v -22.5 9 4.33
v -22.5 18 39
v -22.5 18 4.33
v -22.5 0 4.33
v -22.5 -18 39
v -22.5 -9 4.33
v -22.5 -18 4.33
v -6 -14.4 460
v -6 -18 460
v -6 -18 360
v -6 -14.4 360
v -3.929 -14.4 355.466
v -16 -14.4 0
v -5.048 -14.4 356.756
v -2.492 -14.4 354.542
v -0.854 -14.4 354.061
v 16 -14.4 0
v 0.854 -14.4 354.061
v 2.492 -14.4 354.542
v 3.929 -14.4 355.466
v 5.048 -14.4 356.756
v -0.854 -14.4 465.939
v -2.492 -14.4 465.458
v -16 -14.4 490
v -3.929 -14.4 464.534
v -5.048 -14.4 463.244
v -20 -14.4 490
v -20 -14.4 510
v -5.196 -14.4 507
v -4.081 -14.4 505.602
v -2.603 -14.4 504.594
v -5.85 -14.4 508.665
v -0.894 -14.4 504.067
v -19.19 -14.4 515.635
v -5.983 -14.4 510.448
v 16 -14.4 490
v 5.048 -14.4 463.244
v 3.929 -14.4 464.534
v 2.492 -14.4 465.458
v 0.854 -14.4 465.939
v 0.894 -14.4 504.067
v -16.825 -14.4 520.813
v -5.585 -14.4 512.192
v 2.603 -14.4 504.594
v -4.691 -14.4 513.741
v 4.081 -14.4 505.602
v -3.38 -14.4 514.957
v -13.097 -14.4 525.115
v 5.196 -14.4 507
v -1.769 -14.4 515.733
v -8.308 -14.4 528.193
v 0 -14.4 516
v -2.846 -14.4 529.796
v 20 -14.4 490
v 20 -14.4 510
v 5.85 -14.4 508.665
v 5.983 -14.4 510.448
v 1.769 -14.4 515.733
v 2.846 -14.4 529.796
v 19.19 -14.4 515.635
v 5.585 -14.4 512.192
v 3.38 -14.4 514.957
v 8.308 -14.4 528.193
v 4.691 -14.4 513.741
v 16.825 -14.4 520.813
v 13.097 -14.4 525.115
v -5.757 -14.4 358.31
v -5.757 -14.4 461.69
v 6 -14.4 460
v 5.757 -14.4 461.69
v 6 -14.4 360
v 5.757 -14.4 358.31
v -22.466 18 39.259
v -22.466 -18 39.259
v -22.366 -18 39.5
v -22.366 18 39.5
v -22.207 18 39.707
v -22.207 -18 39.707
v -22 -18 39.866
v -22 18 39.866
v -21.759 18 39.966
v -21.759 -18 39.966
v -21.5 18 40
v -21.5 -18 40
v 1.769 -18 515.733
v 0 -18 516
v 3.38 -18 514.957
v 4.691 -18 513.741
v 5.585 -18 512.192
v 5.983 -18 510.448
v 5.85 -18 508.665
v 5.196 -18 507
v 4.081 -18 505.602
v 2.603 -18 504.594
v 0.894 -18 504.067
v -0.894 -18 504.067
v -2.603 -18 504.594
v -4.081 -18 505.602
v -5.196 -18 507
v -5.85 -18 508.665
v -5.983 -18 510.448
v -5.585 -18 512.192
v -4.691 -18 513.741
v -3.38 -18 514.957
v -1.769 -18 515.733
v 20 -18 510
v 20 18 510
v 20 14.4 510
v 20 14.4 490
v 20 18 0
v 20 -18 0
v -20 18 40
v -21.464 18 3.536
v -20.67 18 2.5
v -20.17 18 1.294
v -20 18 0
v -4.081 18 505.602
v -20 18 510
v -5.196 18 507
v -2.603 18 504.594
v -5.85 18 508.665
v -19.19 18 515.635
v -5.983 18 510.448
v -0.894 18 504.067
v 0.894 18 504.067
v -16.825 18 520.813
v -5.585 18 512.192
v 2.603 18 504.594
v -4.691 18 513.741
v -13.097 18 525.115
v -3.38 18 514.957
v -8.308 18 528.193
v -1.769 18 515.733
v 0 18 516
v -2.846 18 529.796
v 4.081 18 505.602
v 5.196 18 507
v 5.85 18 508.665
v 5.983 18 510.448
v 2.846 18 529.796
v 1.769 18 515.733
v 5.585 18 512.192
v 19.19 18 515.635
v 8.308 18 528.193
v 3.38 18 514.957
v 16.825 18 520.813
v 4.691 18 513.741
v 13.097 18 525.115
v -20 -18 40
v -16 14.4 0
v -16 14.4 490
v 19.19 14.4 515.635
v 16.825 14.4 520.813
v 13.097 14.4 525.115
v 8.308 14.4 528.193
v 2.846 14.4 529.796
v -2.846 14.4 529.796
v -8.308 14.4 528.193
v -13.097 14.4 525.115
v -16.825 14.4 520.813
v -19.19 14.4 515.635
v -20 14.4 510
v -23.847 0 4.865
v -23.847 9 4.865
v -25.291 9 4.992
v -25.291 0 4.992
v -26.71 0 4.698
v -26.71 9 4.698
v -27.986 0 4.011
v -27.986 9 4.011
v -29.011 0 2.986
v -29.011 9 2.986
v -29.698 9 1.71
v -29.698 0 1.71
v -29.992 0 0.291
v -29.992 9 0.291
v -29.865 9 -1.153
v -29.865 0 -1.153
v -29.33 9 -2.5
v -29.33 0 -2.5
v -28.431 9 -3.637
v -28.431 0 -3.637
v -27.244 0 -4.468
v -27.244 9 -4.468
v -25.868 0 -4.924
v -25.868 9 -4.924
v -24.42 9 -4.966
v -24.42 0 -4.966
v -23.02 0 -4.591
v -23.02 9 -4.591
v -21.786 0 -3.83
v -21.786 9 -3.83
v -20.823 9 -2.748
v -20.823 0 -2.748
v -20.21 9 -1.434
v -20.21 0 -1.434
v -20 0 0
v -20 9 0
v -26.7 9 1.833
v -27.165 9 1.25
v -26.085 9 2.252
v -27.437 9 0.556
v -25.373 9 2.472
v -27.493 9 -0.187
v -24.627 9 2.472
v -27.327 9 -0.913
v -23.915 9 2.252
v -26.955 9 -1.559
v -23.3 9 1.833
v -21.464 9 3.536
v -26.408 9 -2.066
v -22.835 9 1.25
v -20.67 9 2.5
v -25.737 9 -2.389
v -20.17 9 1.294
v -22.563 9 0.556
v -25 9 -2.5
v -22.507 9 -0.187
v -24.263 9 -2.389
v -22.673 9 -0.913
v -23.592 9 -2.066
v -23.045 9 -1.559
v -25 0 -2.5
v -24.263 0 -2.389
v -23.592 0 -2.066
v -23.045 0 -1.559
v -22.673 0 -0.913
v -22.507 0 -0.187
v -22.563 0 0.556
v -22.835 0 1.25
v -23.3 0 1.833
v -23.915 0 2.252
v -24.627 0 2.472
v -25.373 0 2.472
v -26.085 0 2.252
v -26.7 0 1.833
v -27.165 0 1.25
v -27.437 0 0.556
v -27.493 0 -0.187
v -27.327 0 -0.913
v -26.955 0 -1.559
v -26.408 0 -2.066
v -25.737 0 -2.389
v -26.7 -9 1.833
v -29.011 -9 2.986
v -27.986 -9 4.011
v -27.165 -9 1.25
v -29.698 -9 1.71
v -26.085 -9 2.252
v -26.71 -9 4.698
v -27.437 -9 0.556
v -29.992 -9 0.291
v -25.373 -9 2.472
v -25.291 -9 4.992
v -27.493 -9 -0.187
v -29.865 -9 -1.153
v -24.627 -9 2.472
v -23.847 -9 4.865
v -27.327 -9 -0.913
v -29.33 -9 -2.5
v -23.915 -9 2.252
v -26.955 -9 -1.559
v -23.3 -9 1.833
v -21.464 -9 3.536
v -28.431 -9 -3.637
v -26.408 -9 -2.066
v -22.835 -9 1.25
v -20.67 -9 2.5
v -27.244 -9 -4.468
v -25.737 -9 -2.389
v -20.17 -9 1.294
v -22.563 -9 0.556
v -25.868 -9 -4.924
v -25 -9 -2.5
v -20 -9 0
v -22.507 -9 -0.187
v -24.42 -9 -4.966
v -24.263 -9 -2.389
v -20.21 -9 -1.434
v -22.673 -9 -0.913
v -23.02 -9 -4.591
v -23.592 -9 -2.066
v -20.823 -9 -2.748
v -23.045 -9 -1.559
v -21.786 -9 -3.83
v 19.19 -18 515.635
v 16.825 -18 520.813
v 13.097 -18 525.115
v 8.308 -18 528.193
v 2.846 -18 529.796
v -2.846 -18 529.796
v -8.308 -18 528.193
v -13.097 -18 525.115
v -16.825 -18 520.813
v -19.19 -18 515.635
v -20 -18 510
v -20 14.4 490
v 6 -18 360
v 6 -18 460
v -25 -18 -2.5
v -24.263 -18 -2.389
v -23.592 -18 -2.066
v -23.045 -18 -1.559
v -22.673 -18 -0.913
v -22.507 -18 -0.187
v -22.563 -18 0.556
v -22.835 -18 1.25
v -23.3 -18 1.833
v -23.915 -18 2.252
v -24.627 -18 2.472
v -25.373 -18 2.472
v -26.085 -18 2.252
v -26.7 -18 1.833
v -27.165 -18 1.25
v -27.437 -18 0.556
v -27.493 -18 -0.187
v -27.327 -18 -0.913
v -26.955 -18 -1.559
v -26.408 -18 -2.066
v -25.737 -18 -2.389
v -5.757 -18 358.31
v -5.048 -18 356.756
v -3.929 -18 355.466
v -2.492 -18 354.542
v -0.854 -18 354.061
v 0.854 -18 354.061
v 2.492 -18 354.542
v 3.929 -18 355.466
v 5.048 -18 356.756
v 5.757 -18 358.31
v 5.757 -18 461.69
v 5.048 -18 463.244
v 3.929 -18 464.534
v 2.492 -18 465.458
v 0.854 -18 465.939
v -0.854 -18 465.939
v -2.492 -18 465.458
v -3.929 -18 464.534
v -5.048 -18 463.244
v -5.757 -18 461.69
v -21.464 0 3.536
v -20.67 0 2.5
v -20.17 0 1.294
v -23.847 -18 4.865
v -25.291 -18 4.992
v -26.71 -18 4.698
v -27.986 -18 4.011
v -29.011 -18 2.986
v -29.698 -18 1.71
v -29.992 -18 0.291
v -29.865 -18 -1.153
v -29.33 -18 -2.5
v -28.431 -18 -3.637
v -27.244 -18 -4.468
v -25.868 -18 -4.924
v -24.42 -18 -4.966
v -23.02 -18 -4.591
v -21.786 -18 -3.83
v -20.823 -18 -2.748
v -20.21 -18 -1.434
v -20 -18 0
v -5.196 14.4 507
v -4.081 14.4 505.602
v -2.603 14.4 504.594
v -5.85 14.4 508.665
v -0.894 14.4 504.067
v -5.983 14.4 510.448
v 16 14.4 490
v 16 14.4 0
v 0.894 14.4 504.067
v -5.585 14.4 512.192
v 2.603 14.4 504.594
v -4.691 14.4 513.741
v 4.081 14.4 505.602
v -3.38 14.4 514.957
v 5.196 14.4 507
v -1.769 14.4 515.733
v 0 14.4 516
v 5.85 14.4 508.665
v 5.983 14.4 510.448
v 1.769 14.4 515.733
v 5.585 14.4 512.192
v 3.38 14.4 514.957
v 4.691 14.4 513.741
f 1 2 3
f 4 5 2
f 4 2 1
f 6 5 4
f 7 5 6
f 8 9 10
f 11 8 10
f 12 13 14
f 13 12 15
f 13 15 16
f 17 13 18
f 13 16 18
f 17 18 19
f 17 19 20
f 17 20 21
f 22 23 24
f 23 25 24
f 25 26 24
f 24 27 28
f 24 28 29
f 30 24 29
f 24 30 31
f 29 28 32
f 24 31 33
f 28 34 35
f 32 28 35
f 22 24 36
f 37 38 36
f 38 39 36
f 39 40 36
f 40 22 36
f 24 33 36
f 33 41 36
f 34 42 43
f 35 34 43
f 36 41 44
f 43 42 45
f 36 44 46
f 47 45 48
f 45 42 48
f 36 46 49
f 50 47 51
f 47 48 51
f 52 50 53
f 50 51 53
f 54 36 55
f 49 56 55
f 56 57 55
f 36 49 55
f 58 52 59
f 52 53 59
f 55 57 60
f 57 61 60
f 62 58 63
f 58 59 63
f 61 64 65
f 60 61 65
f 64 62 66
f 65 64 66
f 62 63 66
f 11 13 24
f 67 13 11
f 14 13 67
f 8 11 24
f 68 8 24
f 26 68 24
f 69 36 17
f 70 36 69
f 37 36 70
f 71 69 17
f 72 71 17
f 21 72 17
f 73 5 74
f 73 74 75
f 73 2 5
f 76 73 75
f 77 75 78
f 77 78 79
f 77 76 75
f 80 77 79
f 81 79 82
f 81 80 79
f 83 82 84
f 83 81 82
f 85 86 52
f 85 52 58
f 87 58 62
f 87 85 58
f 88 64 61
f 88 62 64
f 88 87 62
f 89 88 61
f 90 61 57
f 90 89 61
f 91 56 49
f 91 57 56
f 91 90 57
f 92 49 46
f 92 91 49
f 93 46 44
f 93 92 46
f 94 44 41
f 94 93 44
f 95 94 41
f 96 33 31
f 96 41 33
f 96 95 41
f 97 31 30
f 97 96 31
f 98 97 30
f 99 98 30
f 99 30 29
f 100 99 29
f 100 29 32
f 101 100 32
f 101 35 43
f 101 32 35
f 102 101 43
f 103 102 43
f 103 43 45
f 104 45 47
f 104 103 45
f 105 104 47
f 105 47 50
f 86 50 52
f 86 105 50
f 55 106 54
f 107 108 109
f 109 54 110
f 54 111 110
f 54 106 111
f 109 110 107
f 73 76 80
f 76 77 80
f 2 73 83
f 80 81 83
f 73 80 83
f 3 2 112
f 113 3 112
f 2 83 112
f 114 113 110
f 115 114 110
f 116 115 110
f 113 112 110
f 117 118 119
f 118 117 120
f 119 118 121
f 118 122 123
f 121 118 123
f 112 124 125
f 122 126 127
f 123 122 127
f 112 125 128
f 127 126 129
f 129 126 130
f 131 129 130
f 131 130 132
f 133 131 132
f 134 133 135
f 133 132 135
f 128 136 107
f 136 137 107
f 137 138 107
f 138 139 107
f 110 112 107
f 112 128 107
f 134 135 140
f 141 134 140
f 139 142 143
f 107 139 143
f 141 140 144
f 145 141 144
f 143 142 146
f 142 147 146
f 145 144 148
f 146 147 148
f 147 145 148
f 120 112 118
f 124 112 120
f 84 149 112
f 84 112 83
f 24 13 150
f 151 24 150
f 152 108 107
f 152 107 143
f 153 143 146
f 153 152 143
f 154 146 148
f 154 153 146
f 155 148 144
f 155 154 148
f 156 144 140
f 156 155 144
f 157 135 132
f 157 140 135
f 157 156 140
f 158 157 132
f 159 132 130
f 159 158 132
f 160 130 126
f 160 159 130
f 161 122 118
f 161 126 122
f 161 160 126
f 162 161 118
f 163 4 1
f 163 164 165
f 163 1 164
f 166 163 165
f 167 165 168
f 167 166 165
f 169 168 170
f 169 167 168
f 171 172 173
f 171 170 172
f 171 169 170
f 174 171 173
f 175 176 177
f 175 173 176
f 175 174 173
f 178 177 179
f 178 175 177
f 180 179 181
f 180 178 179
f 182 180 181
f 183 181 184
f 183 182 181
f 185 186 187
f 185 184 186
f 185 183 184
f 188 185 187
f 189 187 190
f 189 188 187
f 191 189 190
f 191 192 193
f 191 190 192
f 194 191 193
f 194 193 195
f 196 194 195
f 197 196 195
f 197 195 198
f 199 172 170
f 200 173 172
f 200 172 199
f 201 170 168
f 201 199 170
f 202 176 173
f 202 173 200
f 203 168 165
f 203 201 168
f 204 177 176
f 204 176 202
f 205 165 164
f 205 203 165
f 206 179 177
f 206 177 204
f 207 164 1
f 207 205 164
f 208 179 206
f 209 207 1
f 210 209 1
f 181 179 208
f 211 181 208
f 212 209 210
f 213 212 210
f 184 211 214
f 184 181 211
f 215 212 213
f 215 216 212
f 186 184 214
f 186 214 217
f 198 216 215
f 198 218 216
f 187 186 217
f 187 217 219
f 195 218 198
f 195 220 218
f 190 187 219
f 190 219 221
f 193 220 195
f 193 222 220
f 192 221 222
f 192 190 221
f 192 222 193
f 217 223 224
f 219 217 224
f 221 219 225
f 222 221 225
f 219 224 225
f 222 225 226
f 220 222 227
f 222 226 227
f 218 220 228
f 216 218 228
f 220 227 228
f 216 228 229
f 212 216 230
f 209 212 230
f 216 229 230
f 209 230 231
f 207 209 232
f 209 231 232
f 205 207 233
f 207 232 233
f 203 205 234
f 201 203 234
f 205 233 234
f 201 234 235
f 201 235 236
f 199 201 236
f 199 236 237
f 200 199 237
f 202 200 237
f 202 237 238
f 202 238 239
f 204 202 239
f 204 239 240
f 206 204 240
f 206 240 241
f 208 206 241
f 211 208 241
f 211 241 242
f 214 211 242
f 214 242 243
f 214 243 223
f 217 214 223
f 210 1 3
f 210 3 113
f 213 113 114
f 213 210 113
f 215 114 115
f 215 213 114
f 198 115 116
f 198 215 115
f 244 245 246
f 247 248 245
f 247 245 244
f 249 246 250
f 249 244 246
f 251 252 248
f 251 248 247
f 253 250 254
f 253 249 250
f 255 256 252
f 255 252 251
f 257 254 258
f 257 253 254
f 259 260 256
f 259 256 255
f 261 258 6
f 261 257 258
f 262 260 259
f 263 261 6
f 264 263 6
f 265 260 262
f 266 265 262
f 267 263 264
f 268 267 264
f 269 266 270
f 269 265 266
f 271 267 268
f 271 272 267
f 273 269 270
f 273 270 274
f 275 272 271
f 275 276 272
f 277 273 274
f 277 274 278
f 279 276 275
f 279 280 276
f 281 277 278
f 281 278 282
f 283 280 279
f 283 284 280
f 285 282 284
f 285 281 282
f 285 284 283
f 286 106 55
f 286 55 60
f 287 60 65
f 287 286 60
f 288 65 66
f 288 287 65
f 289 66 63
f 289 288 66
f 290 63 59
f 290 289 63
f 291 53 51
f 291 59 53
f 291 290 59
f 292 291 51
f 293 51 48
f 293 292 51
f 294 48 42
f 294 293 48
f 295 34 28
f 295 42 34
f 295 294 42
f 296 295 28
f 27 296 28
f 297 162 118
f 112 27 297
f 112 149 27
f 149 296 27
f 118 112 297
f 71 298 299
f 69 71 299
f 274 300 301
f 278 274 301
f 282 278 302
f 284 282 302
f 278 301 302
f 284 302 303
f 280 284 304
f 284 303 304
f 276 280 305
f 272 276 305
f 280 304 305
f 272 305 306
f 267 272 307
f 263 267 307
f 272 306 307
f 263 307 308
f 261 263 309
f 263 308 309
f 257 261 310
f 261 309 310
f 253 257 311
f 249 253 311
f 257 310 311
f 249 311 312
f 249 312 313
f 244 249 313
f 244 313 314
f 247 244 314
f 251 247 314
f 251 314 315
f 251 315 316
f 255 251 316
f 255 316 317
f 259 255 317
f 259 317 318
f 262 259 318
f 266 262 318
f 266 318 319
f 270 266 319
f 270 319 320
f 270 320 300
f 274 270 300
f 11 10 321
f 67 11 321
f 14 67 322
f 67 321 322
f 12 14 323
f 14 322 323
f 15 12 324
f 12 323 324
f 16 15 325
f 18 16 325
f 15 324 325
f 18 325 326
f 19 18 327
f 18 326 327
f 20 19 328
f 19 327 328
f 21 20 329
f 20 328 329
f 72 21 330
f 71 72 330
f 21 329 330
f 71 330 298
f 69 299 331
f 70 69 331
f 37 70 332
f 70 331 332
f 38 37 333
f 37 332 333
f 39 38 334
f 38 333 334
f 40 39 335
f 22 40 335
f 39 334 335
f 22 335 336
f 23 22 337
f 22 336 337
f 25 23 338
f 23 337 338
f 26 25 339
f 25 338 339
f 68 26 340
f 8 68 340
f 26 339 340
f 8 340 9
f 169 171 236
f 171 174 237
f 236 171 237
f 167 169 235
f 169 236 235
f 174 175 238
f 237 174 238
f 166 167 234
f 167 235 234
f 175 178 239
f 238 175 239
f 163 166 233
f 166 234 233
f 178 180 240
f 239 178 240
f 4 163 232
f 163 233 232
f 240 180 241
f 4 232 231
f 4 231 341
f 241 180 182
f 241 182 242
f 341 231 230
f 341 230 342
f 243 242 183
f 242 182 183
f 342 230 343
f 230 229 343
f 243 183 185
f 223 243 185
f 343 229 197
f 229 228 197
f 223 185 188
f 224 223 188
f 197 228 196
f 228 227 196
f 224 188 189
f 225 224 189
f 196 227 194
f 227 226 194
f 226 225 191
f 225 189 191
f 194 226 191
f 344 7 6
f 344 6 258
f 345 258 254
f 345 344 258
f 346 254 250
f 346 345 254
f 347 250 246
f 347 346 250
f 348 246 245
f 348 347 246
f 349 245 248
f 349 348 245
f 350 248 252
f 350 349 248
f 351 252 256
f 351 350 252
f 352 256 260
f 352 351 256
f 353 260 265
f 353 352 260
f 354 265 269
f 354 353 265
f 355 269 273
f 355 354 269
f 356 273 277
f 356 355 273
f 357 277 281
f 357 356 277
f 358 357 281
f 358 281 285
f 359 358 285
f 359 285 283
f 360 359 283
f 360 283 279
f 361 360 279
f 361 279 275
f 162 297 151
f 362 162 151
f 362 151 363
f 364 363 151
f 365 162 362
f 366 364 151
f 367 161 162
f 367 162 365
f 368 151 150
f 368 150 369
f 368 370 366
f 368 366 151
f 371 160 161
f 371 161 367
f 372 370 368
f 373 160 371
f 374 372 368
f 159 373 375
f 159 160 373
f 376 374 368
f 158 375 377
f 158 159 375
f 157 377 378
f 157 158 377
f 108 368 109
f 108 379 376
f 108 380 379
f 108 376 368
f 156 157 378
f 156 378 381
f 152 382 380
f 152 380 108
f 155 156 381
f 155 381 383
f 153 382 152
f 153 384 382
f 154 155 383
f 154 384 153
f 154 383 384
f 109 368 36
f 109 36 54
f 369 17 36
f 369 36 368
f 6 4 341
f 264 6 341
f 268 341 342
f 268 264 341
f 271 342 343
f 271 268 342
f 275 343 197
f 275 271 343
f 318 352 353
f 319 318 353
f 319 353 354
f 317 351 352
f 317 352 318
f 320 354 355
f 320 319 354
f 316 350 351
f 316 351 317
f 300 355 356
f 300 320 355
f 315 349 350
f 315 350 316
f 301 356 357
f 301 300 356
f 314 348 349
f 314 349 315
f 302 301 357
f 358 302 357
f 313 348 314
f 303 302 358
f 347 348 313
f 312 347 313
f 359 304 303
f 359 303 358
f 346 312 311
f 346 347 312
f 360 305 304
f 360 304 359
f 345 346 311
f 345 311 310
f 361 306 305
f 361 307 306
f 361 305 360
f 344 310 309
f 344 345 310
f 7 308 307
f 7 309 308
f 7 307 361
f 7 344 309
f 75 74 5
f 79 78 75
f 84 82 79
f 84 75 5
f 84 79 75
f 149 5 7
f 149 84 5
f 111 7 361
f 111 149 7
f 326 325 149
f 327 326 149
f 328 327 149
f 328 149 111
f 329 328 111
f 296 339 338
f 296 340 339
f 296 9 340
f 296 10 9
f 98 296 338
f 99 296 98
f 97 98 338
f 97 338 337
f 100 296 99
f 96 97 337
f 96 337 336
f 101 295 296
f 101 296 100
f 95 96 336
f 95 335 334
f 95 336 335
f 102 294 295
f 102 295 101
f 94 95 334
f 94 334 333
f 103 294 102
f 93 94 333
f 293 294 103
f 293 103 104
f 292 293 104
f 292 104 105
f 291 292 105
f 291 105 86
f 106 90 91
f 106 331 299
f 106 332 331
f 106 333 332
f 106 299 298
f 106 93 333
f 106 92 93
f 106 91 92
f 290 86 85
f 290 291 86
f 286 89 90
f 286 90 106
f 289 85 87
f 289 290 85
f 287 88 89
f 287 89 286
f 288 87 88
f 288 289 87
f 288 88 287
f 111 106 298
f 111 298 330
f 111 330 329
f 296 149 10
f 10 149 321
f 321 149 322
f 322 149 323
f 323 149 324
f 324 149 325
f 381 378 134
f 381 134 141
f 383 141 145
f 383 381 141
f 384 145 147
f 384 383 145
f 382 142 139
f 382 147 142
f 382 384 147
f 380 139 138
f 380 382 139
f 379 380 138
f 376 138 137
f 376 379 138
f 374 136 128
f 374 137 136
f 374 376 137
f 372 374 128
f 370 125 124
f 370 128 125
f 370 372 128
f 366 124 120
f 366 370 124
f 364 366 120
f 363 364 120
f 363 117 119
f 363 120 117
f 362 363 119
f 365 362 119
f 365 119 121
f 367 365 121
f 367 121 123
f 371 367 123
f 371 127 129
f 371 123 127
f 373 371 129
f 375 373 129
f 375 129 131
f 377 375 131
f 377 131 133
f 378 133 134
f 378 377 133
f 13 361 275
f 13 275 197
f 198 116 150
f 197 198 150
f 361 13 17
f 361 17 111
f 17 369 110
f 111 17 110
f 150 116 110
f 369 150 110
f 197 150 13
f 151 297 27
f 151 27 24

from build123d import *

# Parameters (mm, degrees)
SKETCH1_W               = 40
SKETCH1_H               = 36
SKETCH1_W_2             = 32
SKETCH1_H_2             = 28.8
BOSS_EXTRUDE1_DEPTH     = 530
SKETCH2_W               = 50
SKETCH2_H               = 28.8
CUT_EXTRUDE1_DEPTH      = 40
FILLET2_RADIUS          = 20
FILLET2_LENGTH          = 3.6
FILLET3_RADIUS          = 20
FILLET3_LENGTH          = 3.6
CUT_EXTRUDE2_DEPTH      = 532.597592169
CUT_EXTRUDE2_DEPTH_BACK = 532.597592169
SKETCH3_R               = 6
CUT_EXTRUDE3_DEPTH      = 10
SKETCH12_R              = 2.5
BOSS_EXTRUDE3_DEPTH     = 36
CUT_EXTRUDE6_START      = -9
SKETCH13_R              = 5
CUT_EXTRUDE6_DEPTH      = 9
CUT_EXTRUDE7_START      = -9
SKETCH14_R              = 5
CUT_EXTRUDE7_DEPTH      = 9
FILLET6_R               = 1


with BuildPart() as part:
    # Sketch1 → Boss-Extrude1 (new body)
    with BuildSketch(Plane.XY):
        Rectangle(SKETCH1_W, SKETCH1_H)
        Rectangle(SKETCH1_W_2, SKETCH1_H_2, mode=Mode.SUBTRACT)
    extrude(amount=BOSS_EXTRUDE1_DEPTH)

    # Sketch2 → Cut-Extrude1 (cut)
    with BuildSketch(Plane.XY.offset(530)):
        Rectangle(SKETCH2_W, SKETCH2_H)
    extrude(amount=-CUT_EXTRUDE1_DEPTH, mode=Mode.SUBTRACT)

    # Fillet2: full round fillet: the end face becomes a half cylinder, R = half its width
    fillet2_face = Plane((0, -16.2, 530), x_dir=(0, -1, 0), z_dir=(0, 0, 1))  # on the end face: x along it, z out of the body
    fillet2_slab = fillet2_face.offset(-FILLET2_RADIUS / 2) * Box(FILLET2_LENGTH, 2 * FILLET2_RADIUS, FILLET2_RADIUS, mode=Mode.PRIVATE)  # the body's end, R deep
    fillet2_round = Plane((0, -16.2, 510), x_dir=(0, 0, 1), z_dir=(0, -1, 0)) * Cylinder(FILLET2_RADIUS, FILLET2_LENGTH, mode=Mode.PRIVATE)  # its axis R under the face
    add(fillet2_slab - fillet2_round, mode=Mode.SUBTRACT)

    # Fillet3: full round fillet: the end face becomes a half cylinder, R = half its width
    fillet3_face = Plane((0, 16.2, 530), x_dir=(0, -1, 0), z_dir=(0, 0, 1))  # on the end face: x along it, z out of the body
    fillet3_slab = fillet3_face.offset(-FILLET3_RADIUS / 2) * Box(FILLET3_LENGTH, 2 * FILLET3_RADIUS, FILLET3_RADIUS, mode=Mode.PRIVATE)  # the body's end, R deep
    fillet3_round = Plane((0, 16.2, 510), x_dir=(0, 0, 1), z_dir=(0, -1, 0)) * Cylinder(FILLET3_RADIUS, FILLET3_LENGTH, mode=Mode.PRIVATE)  # its axis R under the face
    add(fillet3_slab - fillet3_round, mode=Mode.SUBTRACT)

    # Sketch3 → Cut-Extrude2 (cut, two sides: drawn at the far end of the back side and taken through both)
    with BuildSketch(Plane(origin=(0, 18, 0), x_dir=(1, 0, 0), z_dir=(0, 1, 0)).offset(-CUT_EXTRUDE2_DEPTH_BACK)):
        with Locations(Location((0, -510, 0), (0, 0, 270))):
            Circle(SKETCH3_R)
    extrude(amount=CUT_EXTRUDE2_DEPTH + CUT_EXTRUDE2_DEPTH_BACK, mode=Mode.SUBTRACT)

    # Sketch6 → Cut-Extrude3 (cut)
    with BuildSketch(Plane.XZ.offset(18)):
        with BuildLine():
            ThreePointArc((6, 460), (0, 466), (-6, 460))
            Line((-6, 460), (-6, 360))
            ThreePointArc((-6, 360), (0, 354), (6, 360))
            Line((6, 360), (6, 460))
        make_face()
    extrude(amount=-CUT_EXTRUDE3_DEPTH, mode=Mode.SUBTRACT)

    # Sketch12 → Boss-Extrude3 (add)
    with BuildSketch(Plane.XZ.offset(18)):
        with BuildLine():
            Line((-20, 0), (-20, 40))
            Line((-20, 40), (-22.5, 40))
            Line((-22.5, 40), (-22.5, 4.330127019))
            ThreePointArc((-22.5, 4.330127019), (-29.330127019, -2.5), (-20, 0))
        make_face()
        with Locations(Location((-25, 0, 0), (0, 0, 270))):
            Circle(SKETCH12_R, mode=Mode.SUBTRACT)
    extrude(amount=-BOSS_EXTRUDE3_DEPTH)

    # Sketch13 → Cut-Extrude6 (cut)
    with BuildSketch(Plane(origin=(0, 18, 0), x_dir=(1, 0, 0), z_dir=(0, 1, 0)).offset(CUT_EXTRUDE6_START)):
        with Locations((-25, 0)):
            Circle(SKETCH13_R)
    extrude(amount=CUT_EXTRUDE6_DEPTH, mode=Mode.SUBTRACT)

    # Sketch14 → Cut-Extrude7 (cut)
    with BuildSketch(Plane(origin=(0, 0, 0), x_dir=(1, 0, 0), z_dir=(0, 1, 0)).offset(CUT_EXTRUDE7_START)):
        with Locations((-25, 0)):
            Circle(SKETCH14_R)
    extrude(amount=CUT_EXTRUDE7_DEPTH, mode=Mode.SUBTRACT)

    # Fillet6
    fillet6_edges = [part.edges().sort_by_distance(p)[0] for p in [
        (-22.5, 0, 40),
    ]]
    fillet(fillet6_edges, radius=FILLET6_R)


solid = part.part
